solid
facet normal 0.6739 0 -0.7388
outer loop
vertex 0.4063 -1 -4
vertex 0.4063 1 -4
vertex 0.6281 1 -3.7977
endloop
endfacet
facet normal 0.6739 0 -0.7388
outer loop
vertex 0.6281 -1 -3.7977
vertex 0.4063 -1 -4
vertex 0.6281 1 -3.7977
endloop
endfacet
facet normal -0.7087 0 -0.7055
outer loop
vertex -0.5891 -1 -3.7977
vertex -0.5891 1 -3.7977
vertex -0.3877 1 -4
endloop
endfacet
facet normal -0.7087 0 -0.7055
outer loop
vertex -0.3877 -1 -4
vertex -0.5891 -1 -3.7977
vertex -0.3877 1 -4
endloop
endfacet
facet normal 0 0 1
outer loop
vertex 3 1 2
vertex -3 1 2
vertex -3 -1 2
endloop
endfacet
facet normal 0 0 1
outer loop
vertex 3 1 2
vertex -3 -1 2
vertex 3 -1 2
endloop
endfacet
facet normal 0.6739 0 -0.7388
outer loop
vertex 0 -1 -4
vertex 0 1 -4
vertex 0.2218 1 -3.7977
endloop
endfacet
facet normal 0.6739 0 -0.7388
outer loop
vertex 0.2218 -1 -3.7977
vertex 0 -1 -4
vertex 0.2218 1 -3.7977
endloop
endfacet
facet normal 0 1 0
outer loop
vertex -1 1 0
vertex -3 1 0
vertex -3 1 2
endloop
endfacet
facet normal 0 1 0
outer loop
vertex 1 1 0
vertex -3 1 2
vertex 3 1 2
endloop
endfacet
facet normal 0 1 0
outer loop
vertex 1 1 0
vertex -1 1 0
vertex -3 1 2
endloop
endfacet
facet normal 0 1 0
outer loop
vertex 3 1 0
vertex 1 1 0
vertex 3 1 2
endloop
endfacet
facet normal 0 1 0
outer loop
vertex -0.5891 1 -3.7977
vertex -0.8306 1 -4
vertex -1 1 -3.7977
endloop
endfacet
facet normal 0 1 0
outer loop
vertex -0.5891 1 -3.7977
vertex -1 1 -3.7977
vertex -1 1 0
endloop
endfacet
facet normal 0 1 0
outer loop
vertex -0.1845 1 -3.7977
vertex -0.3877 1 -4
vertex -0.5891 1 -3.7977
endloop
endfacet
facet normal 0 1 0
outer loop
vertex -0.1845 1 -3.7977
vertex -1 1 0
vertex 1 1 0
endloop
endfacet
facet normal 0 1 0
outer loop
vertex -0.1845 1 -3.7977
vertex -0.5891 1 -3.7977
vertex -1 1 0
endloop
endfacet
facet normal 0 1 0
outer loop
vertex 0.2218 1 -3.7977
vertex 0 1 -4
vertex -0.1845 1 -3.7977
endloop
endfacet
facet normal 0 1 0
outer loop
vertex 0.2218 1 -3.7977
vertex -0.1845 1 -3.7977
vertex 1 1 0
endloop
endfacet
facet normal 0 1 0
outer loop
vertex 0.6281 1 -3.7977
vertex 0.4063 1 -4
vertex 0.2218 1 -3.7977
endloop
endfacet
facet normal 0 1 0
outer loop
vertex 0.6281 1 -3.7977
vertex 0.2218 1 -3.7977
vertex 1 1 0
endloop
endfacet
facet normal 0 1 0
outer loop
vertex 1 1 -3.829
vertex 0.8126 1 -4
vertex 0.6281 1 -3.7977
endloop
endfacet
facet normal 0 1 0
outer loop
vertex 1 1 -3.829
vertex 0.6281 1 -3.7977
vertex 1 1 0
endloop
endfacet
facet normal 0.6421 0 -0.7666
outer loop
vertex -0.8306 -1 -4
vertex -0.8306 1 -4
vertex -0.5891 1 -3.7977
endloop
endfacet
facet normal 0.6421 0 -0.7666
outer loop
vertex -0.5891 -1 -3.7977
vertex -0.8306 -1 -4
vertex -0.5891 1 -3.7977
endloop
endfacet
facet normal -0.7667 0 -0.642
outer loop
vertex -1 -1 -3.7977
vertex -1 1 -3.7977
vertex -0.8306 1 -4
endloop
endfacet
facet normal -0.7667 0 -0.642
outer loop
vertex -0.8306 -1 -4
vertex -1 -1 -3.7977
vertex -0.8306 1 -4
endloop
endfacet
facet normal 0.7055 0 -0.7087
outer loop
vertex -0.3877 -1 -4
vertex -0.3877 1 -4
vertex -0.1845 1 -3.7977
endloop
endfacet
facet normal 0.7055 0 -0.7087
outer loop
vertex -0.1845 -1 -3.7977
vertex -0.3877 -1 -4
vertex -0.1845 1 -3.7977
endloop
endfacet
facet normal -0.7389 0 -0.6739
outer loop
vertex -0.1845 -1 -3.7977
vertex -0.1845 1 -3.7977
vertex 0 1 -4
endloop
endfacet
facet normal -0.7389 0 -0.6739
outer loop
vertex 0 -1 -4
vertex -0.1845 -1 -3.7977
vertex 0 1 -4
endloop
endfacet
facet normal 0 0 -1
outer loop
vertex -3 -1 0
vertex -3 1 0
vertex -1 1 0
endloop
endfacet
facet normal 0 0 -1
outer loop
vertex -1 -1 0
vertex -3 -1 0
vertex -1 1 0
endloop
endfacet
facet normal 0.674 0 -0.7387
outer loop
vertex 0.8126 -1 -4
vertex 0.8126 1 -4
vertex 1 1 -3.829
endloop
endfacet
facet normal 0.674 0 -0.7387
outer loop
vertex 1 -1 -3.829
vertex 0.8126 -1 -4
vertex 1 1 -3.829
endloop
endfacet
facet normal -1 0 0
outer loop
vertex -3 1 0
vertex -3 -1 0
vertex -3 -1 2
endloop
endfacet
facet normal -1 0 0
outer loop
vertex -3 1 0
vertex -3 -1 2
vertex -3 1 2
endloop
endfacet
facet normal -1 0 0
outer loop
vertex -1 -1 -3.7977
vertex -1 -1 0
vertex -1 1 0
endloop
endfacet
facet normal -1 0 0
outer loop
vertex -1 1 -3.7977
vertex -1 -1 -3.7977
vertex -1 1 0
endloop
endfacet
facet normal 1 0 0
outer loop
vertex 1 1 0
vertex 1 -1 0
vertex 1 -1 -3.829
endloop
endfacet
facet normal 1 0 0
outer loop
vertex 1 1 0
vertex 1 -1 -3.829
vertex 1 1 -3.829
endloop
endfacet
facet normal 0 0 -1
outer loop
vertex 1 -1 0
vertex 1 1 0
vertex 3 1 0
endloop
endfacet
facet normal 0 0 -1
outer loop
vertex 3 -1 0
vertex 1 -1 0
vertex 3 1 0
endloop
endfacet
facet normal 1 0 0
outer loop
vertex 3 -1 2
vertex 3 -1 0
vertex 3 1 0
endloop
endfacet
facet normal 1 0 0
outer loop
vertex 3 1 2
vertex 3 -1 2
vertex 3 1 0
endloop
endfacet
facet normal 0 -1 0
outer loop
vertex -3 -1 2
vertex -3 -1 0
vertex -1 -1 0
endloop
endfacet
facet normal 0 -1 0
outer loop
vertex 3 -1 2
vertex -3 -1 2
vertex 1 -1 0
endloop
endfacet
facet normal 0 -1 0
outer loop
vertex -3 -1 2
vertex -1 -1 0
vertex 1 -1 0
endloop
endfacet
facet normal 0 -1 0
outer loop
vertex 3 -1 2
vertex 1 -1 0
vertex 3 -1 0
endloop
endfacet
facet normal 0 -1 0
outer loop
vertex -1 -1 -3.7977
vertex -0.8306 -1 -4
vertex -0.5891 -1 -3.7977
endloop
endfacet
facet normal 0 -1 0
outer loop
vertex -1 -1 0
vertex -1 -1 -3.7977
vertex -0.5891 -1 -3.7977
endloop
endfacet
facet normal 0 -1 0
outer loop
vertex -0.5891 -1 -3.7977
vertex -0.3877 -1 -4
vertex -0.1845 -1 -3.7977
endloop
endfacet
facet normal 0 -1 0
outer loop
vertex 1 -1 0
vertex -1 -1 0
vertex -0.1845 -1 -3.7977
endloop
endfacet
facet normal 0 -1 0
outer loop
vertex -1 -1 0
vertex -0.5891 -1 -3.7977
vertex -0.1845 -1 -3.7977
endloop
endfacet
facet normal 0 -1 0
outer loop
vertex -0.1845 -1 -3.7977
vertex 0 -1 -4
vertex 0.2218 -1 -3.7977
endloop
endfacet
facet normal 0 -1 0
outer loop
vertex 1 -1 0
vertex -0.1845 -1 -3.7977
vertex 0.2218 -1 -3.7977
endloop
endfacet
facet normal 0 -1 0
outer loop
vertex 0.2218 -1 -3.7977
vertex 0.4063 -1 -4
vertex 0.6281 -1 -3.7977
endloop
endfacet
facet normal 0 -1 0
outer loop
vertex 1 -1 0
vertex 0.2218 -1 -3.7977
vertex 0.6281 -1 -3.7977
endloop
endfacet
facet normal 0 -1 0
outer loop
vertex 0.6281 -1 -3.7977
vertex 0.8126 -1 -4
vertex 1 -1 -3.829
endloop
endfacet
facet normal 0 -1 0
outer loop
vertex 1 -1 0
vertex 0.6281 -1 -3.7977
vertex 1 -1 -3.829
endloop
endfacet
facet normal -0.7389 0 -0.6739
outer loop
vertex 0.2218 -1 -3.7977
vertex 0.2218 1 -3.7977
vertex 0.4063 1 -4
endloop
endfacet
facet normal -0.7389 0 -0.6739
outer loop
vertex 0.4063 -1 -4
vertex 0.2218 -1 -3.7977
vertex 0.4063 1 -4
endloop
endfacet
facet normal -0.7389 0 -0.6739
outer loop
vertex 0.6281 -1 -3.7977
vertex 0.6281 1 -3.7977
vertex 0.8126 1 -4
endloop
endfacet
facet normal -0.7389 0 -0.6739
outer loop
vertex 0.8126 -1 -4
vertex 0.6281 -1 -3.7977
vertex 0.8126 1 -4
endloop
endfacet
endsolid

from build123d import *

# Parameters (mm, degrees)
SKETCH_1_W          = 6
SKETCH_1_H          = 2
EXTRUDE_1_DEPTH     = 2
SKETCH_2_W          = 2
SKETCH_2_H          = 2
EXTRUDE_2_DEPTH     = 4
CUT_EXTRUDE_1_DEPTH = 4


with BuildPart() as part:
    # 草图1 → 凸台-拉伸1 (new body)
    with BuildSketch(Plane.XY):
        Rectangle(SKETCH_1_W, SKETCH_1_H)
    extrude(amount=EXTRUDE_1_DEPTH)

    # 草图2 → 凸台-拉伸2 (add)
    with BuildSketch(Plane(origin=(0, 0, 0), x_dir=(-1, 0, 0), z_dir=(0, 0, -1))):
        Rectangle(SKETCH_2_W, SKETCH_2_H)
    extrude(amount=EXTRUDE_2_DEPTH)

    # 草图3 → 切除-拉伸1 (cut)
    with BuildSketch(Plane(origin=(0, 1, 0), x_dir=(1, 0, 0), z_dir=(0, 1, 0))):
        Polygon((-1, 3.79771899), (-0.830611616, 4), (-0.589050738, 3.79771899), (-0.387722732, 4), (-0.184484207, 3.79771899), (0, 4), (0.221794632, 3.79771899), (0.406278839, 4), (0.628073471, 3.79771899), (0.812557678, 4), (1, 3.829048964), (1.133730845, 3.829048964), (1.133730845, 4.163918303), (-1.101555404, 4.163918303), (-1.101555404, 3.79771899), align=None)
    extrude(amount=-CUT_EXTRUDE_1_DEPTH, mode=Mode.SUBTRACT)


solid = part.part
